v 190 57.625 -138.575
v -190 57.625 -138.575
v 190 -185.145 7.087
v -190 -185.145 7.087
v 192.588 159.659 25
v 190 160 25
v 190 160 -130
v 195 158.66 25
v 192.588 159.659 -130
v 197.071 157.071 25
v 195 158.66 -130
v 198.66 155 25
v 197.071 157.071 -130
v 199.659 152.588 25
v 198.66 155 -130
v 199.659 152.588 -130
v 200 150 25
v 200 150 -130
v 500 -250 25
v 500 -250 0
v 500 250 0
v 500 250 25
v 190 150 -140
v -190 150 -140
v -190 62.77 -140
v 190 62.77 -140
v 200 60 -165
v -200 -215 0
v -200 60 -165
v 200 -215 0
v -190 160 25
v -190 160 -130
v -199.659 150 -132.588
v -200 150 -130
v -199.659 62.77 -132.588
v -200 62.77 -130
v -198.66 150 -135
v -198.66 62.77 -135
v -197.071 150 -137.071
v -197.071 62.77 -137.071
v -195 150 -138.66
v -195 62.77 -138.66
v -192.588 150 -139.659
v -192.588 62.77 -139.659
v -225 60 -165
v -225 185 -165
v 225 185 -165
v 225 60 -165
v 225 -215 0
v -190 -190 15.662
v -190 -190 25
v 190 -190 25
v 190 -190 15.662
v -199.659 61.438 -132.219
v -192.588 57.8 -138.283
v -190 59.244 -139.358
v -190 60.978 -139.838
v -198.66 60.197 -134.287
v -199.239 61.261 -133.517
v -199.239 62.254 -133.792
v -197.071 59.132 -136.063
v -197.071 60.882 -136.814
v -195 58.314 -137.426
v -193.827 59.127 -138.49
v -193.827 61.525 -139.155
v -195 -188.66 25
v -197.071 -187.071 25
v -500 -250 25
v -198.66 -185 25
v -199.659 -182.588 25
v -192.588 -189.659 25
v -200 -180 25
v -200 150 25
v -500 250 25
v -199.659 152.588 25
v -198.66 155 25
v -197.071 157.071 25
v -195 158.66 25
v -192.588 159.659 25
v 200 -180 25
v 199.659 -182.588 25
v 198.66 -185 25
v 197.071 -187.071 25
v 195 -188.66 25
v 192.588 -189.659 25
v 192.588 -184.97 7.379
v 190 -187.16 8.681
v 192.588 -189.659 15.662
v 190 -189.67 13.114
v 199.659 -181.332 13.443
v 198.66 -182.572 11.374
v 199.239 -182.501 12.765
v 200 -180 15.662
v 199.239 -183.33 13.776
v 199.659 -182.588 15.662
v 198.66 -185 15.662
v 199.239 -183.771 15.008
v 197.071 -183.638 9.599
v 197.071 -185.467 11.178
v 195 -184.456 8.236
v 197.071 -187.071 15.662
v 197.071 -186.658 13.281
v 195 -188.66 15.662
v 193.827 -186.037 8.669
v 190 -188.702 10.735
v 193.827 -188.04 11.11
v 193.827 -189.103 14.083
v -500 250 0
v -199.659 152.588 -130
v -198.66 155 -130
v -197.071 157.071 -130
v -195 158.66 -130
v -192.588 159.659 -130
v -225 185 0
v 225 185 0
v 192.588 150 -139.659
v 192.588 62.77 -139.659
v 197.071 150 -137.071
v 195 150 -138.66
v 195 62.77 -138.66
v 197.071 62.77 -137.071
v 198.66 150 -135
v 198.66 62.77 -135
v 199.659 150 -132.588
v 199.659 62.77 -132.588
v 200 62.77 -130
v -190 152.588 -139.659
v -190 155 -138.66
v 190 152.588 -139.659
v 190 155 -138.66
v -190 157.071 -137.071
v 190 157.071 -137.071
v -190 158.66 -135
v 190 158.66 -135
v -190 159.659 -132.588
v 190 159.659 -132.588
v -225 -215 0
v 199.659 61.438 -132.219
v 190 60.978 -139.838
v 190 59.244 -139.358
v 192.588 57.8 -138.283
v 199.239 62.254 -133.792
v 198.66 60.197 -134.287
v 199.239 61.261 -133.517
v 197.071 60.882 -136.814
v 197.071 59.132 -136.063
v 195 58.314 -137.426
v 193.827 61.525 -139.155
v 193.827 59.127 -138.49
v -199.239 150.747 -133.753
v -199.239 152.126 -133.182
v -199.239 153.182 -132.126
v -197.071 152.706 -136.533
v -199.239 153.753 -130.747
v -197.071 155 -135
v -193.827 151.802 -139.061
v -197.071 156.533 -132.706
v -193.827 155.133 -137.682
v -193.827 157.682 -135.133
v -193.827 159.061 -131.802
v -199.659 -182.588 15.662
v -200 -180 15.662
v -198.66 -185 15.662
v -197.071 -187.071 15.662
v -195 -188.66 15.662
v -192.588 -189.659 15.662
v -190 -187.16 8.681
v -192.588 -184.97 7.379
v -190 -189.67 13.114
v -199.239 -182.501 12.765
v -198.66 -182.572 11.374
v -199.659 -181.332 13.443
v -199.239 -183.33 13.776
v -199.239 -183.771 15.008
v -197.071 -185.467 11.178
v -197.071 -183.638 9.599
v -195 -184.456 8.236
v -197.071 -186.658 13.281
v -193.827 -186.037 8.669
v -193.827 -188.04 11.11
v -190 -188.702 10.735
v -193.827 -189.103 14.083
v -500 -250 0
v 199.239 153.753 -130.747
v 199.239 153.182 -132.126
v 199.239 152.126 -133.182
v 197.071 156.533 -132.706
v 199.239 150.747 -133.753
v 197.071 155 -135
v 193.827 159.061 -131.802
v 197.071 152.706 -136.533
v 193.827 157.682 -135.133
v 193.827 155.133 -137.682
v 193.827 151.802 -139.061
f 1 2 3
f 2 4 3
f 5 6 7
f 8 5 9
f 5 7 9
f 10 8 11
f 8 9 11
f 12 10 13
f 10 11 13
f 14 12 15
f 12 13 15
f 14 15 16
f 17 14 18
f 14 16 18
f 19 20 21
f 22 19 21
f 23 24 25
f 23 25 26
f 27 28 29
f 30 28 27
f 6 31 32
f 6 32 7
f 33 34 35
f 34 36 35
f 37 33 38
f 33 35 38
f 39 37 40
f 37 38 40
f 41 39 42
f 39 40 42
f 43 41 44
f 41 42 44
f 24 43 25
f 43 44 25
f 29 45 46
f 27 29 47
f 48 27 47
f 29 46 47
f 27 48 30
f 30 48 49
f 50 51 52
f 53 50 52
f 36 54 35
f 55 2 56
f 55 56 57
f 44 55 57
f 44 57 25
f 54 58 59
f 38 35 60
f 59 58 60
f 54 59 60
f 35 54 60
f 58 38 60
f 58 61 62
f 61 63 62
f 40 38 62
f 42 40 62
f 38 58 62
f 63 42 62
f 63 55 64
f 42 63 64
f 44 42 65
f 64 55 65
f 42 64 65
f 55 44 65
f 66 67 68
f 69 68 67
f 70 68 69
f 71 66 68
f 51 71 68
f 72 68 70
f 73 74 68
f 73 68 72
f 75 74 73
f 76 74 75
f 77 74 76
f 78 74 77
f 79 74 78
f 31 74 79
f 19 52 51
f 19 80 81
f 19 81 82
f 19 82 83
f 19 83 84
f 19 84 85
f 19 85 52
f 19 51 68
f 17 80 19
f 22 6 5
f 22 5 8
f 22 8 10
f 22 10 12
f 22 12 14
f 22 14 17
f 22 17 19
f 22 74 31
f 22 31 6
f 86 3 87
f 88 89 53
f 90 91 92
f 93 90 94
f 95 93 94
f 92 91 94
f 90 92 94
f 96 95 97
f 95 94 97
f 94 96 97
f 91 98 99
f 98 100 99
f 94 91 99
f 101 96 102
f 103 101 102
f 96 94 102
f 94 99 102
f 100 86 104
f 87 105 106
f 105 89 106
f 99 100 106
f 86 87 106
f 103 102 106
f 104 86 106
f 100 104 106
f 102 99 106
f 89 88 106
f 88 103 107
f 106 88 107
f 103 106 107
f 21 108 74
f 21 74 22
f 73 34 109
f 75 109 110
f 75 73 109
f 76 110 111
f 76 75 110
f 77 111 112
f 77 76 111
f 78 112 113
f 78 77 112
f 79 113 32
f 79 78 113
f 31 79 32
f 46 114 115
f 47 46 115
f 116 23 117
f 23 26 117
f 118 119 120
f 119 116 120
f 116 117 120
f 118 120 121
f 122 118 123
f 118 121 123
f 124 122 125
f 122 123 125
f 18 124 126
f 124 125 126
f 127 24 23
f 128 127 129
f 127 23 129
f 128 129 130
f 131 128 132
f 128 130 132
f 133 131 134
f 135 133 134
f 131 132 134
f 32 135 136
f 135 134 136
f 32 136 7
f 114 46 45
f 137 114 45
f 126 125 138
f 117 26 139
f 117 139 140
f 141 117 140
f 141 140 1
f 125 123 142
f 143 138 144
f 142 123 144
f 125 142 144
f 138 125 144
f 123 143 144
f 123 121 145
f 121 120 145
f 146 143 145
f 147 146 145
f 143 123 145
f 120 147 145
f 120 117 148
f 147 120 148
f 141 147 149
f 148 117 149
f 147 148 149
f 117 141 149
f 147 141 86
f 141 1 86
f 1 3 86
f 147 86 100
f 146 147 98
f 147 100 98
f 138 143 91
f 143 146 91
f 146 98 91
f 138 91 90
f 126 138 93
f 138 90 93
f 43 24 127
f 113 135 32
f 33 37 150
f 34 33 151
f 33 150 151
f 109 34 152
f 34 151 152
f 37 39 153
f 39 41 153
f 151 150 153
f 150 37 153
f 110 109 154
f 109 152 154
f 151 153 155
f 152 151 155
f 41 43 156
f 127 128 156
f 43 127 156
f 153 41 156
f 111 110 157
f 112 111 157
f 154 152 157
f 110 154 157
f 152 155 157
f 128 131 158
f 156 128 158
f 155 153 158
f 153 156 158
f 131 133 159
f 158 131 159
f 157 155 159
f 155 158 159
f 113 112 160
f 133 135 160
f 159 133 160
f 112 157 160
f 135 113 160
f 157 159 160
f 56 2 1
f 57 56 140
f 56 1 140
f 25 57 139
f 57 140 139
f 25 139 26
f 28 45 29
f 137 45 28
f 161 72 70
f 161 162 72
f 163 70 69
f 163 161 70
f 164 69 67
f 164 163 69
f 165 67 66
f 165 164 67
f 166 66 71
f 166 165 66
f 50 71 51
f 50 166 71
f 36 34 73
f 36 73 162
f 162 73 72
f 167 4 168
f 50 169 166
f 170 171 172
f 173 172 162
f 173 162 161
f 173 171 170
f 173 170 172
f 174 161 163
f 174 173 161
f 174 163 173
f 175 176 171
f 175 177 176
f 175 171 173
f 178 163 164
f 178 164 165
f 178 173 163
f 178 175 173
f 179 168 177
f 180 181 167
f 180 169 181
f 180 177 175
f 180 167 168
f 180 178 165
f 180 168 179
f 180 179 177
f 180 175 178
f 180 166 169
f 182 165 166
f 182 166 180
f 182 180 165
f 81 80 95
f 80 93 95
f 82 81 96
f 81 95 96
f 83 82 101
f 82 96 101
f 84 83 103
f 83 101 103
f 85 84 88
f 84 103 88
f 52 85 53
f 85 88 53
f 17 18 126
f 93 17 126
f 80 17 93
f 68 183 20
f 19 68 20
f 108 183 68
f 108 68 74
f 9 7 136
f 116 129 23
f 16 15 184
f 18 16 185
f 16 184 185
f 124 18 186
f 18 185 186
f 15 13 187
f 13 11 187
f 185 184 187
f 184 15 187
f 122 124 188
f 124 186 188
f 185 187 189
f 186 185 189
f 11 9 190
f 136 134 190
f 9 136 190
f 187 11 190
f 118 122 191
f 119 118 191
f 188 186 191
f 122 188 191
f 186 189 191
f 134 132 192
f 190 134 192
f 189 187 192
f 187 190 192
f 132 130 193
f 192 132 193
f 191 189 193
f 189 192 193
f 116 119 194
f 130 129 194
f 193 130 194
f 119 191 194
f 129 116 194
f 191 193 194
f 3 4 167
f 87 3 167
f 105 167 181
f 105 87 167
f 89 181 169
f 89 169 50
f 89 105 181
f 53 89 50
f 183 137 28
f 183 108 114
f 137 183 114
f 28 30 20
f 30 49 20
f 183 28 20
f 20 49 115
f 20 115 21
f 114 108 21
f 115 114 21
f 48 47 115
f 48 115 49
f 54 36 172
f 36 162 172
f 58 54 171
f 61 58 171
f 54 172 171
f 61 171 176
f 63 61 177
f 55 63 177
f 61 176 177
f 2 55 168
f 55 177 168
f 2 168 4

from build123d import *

# Parameters (mm, degrees)
F0_W      = 1000
F0_H      = 500
F1_DEPTH  = 25
F2_W      = 400
F2_H      = 350
F3_DEPTH  = 25
F4_W      = 450
F4_H      = 25
F5_DEPTH  = 165
F6_W      = 450
F6_H      = 25
F7_DEPTH  = 100
F9_DEPTH  = 25
F10_W     = 450
F10_H     = 320.7023542165
F11_DEPTH = 21.4373231428
F12_R     = 10


# Not quite as in the source:
# - a pattern or mirror of a feature is missing from the dataset's text; its kind, count and spacing are read off the source's solid


with BuildPart() as f1:
    # F0 (on Top) → F1 (new body)
    with BuildSketch(Plane.XY):
        Rectangle(F0_W, F0_H)
    extrude(amount=F1_DEPTH)

    # F2 (on face) → F3 (cut, through all)
    with BuildSketch(Plane.XY.offset(25)):
        with Locations((0, -15)):
            Rectangle(F2_W, F2_H)
    extrude(amount=-F3_DEPTH, mode=Mode.SUBTRACT)

    # F4 (on face) → F5 (join)
    with BuildSketch(Plane(origin=(0, 0, 0), x_dir=(1, 0, 0), z_dir=(0, 0, -1))):
        with Locations((0, -172.5)):
            Rectangle(F4_W, F4_H)
    extrude(amount=F5_DEPTH)

    # F6 (on face) → F7 (join)
    with BuildSketch(Plane.XZ.offset(-160)):
        with Locations((0, -152.5)):
            Rectangle(F6_W, F6_H)
    extrude(amount=F7_DEPTH)

    # F8 (on face) → F9 (join)
    with BuildSketch(Plane(origin=(-225, 0, 0), x_dir=(0, -1, 0), z_dir=(-1, 0, 0))):
        Polygon((215, 0), (-185, 0), (-185, -165), (-60, -165), align=None)
    f9 = extrude(amount=-F9_DEPTH)

    # F9_copies: F9 across plane
    add(f9.mirror(Plane(origin=(0, 0, 0), x_dir=(0, 0, 1), z_dir=(1, 0, 0))))

    # F10 (on face) → F11 (join, through all)
    with BuildSketch(Plane(origin=(0, -56.9117647059, -94.8529411765), x_dir=(1, 0, 0), z_dir=(0, -0.5144957554, -0.8574929257))):
        with Locations((0, 24.00980192)):
            Rectangle(F10_W, F10_H)
    extrude(amount=-F11_DEPTH)

    # F12
    f12_edges = [f1.edges().sort_by_distance(p)[0] for p in [
        (0, 160, -140),
        (-200, 110, -140),
        (-200, 160, -57.5),
        (0, 60, -140),
        (-200, -65, -65),
        (-200, -190, 17.5),
        (200, -190, 17.5),
        (0, -190, 10),
        (200, 160, -57.5),
        (200, 110, -140),
        (200, -65, -65),
    ]]
    fillet(f12_edges, radius=F12_R)


solid = f1.part
